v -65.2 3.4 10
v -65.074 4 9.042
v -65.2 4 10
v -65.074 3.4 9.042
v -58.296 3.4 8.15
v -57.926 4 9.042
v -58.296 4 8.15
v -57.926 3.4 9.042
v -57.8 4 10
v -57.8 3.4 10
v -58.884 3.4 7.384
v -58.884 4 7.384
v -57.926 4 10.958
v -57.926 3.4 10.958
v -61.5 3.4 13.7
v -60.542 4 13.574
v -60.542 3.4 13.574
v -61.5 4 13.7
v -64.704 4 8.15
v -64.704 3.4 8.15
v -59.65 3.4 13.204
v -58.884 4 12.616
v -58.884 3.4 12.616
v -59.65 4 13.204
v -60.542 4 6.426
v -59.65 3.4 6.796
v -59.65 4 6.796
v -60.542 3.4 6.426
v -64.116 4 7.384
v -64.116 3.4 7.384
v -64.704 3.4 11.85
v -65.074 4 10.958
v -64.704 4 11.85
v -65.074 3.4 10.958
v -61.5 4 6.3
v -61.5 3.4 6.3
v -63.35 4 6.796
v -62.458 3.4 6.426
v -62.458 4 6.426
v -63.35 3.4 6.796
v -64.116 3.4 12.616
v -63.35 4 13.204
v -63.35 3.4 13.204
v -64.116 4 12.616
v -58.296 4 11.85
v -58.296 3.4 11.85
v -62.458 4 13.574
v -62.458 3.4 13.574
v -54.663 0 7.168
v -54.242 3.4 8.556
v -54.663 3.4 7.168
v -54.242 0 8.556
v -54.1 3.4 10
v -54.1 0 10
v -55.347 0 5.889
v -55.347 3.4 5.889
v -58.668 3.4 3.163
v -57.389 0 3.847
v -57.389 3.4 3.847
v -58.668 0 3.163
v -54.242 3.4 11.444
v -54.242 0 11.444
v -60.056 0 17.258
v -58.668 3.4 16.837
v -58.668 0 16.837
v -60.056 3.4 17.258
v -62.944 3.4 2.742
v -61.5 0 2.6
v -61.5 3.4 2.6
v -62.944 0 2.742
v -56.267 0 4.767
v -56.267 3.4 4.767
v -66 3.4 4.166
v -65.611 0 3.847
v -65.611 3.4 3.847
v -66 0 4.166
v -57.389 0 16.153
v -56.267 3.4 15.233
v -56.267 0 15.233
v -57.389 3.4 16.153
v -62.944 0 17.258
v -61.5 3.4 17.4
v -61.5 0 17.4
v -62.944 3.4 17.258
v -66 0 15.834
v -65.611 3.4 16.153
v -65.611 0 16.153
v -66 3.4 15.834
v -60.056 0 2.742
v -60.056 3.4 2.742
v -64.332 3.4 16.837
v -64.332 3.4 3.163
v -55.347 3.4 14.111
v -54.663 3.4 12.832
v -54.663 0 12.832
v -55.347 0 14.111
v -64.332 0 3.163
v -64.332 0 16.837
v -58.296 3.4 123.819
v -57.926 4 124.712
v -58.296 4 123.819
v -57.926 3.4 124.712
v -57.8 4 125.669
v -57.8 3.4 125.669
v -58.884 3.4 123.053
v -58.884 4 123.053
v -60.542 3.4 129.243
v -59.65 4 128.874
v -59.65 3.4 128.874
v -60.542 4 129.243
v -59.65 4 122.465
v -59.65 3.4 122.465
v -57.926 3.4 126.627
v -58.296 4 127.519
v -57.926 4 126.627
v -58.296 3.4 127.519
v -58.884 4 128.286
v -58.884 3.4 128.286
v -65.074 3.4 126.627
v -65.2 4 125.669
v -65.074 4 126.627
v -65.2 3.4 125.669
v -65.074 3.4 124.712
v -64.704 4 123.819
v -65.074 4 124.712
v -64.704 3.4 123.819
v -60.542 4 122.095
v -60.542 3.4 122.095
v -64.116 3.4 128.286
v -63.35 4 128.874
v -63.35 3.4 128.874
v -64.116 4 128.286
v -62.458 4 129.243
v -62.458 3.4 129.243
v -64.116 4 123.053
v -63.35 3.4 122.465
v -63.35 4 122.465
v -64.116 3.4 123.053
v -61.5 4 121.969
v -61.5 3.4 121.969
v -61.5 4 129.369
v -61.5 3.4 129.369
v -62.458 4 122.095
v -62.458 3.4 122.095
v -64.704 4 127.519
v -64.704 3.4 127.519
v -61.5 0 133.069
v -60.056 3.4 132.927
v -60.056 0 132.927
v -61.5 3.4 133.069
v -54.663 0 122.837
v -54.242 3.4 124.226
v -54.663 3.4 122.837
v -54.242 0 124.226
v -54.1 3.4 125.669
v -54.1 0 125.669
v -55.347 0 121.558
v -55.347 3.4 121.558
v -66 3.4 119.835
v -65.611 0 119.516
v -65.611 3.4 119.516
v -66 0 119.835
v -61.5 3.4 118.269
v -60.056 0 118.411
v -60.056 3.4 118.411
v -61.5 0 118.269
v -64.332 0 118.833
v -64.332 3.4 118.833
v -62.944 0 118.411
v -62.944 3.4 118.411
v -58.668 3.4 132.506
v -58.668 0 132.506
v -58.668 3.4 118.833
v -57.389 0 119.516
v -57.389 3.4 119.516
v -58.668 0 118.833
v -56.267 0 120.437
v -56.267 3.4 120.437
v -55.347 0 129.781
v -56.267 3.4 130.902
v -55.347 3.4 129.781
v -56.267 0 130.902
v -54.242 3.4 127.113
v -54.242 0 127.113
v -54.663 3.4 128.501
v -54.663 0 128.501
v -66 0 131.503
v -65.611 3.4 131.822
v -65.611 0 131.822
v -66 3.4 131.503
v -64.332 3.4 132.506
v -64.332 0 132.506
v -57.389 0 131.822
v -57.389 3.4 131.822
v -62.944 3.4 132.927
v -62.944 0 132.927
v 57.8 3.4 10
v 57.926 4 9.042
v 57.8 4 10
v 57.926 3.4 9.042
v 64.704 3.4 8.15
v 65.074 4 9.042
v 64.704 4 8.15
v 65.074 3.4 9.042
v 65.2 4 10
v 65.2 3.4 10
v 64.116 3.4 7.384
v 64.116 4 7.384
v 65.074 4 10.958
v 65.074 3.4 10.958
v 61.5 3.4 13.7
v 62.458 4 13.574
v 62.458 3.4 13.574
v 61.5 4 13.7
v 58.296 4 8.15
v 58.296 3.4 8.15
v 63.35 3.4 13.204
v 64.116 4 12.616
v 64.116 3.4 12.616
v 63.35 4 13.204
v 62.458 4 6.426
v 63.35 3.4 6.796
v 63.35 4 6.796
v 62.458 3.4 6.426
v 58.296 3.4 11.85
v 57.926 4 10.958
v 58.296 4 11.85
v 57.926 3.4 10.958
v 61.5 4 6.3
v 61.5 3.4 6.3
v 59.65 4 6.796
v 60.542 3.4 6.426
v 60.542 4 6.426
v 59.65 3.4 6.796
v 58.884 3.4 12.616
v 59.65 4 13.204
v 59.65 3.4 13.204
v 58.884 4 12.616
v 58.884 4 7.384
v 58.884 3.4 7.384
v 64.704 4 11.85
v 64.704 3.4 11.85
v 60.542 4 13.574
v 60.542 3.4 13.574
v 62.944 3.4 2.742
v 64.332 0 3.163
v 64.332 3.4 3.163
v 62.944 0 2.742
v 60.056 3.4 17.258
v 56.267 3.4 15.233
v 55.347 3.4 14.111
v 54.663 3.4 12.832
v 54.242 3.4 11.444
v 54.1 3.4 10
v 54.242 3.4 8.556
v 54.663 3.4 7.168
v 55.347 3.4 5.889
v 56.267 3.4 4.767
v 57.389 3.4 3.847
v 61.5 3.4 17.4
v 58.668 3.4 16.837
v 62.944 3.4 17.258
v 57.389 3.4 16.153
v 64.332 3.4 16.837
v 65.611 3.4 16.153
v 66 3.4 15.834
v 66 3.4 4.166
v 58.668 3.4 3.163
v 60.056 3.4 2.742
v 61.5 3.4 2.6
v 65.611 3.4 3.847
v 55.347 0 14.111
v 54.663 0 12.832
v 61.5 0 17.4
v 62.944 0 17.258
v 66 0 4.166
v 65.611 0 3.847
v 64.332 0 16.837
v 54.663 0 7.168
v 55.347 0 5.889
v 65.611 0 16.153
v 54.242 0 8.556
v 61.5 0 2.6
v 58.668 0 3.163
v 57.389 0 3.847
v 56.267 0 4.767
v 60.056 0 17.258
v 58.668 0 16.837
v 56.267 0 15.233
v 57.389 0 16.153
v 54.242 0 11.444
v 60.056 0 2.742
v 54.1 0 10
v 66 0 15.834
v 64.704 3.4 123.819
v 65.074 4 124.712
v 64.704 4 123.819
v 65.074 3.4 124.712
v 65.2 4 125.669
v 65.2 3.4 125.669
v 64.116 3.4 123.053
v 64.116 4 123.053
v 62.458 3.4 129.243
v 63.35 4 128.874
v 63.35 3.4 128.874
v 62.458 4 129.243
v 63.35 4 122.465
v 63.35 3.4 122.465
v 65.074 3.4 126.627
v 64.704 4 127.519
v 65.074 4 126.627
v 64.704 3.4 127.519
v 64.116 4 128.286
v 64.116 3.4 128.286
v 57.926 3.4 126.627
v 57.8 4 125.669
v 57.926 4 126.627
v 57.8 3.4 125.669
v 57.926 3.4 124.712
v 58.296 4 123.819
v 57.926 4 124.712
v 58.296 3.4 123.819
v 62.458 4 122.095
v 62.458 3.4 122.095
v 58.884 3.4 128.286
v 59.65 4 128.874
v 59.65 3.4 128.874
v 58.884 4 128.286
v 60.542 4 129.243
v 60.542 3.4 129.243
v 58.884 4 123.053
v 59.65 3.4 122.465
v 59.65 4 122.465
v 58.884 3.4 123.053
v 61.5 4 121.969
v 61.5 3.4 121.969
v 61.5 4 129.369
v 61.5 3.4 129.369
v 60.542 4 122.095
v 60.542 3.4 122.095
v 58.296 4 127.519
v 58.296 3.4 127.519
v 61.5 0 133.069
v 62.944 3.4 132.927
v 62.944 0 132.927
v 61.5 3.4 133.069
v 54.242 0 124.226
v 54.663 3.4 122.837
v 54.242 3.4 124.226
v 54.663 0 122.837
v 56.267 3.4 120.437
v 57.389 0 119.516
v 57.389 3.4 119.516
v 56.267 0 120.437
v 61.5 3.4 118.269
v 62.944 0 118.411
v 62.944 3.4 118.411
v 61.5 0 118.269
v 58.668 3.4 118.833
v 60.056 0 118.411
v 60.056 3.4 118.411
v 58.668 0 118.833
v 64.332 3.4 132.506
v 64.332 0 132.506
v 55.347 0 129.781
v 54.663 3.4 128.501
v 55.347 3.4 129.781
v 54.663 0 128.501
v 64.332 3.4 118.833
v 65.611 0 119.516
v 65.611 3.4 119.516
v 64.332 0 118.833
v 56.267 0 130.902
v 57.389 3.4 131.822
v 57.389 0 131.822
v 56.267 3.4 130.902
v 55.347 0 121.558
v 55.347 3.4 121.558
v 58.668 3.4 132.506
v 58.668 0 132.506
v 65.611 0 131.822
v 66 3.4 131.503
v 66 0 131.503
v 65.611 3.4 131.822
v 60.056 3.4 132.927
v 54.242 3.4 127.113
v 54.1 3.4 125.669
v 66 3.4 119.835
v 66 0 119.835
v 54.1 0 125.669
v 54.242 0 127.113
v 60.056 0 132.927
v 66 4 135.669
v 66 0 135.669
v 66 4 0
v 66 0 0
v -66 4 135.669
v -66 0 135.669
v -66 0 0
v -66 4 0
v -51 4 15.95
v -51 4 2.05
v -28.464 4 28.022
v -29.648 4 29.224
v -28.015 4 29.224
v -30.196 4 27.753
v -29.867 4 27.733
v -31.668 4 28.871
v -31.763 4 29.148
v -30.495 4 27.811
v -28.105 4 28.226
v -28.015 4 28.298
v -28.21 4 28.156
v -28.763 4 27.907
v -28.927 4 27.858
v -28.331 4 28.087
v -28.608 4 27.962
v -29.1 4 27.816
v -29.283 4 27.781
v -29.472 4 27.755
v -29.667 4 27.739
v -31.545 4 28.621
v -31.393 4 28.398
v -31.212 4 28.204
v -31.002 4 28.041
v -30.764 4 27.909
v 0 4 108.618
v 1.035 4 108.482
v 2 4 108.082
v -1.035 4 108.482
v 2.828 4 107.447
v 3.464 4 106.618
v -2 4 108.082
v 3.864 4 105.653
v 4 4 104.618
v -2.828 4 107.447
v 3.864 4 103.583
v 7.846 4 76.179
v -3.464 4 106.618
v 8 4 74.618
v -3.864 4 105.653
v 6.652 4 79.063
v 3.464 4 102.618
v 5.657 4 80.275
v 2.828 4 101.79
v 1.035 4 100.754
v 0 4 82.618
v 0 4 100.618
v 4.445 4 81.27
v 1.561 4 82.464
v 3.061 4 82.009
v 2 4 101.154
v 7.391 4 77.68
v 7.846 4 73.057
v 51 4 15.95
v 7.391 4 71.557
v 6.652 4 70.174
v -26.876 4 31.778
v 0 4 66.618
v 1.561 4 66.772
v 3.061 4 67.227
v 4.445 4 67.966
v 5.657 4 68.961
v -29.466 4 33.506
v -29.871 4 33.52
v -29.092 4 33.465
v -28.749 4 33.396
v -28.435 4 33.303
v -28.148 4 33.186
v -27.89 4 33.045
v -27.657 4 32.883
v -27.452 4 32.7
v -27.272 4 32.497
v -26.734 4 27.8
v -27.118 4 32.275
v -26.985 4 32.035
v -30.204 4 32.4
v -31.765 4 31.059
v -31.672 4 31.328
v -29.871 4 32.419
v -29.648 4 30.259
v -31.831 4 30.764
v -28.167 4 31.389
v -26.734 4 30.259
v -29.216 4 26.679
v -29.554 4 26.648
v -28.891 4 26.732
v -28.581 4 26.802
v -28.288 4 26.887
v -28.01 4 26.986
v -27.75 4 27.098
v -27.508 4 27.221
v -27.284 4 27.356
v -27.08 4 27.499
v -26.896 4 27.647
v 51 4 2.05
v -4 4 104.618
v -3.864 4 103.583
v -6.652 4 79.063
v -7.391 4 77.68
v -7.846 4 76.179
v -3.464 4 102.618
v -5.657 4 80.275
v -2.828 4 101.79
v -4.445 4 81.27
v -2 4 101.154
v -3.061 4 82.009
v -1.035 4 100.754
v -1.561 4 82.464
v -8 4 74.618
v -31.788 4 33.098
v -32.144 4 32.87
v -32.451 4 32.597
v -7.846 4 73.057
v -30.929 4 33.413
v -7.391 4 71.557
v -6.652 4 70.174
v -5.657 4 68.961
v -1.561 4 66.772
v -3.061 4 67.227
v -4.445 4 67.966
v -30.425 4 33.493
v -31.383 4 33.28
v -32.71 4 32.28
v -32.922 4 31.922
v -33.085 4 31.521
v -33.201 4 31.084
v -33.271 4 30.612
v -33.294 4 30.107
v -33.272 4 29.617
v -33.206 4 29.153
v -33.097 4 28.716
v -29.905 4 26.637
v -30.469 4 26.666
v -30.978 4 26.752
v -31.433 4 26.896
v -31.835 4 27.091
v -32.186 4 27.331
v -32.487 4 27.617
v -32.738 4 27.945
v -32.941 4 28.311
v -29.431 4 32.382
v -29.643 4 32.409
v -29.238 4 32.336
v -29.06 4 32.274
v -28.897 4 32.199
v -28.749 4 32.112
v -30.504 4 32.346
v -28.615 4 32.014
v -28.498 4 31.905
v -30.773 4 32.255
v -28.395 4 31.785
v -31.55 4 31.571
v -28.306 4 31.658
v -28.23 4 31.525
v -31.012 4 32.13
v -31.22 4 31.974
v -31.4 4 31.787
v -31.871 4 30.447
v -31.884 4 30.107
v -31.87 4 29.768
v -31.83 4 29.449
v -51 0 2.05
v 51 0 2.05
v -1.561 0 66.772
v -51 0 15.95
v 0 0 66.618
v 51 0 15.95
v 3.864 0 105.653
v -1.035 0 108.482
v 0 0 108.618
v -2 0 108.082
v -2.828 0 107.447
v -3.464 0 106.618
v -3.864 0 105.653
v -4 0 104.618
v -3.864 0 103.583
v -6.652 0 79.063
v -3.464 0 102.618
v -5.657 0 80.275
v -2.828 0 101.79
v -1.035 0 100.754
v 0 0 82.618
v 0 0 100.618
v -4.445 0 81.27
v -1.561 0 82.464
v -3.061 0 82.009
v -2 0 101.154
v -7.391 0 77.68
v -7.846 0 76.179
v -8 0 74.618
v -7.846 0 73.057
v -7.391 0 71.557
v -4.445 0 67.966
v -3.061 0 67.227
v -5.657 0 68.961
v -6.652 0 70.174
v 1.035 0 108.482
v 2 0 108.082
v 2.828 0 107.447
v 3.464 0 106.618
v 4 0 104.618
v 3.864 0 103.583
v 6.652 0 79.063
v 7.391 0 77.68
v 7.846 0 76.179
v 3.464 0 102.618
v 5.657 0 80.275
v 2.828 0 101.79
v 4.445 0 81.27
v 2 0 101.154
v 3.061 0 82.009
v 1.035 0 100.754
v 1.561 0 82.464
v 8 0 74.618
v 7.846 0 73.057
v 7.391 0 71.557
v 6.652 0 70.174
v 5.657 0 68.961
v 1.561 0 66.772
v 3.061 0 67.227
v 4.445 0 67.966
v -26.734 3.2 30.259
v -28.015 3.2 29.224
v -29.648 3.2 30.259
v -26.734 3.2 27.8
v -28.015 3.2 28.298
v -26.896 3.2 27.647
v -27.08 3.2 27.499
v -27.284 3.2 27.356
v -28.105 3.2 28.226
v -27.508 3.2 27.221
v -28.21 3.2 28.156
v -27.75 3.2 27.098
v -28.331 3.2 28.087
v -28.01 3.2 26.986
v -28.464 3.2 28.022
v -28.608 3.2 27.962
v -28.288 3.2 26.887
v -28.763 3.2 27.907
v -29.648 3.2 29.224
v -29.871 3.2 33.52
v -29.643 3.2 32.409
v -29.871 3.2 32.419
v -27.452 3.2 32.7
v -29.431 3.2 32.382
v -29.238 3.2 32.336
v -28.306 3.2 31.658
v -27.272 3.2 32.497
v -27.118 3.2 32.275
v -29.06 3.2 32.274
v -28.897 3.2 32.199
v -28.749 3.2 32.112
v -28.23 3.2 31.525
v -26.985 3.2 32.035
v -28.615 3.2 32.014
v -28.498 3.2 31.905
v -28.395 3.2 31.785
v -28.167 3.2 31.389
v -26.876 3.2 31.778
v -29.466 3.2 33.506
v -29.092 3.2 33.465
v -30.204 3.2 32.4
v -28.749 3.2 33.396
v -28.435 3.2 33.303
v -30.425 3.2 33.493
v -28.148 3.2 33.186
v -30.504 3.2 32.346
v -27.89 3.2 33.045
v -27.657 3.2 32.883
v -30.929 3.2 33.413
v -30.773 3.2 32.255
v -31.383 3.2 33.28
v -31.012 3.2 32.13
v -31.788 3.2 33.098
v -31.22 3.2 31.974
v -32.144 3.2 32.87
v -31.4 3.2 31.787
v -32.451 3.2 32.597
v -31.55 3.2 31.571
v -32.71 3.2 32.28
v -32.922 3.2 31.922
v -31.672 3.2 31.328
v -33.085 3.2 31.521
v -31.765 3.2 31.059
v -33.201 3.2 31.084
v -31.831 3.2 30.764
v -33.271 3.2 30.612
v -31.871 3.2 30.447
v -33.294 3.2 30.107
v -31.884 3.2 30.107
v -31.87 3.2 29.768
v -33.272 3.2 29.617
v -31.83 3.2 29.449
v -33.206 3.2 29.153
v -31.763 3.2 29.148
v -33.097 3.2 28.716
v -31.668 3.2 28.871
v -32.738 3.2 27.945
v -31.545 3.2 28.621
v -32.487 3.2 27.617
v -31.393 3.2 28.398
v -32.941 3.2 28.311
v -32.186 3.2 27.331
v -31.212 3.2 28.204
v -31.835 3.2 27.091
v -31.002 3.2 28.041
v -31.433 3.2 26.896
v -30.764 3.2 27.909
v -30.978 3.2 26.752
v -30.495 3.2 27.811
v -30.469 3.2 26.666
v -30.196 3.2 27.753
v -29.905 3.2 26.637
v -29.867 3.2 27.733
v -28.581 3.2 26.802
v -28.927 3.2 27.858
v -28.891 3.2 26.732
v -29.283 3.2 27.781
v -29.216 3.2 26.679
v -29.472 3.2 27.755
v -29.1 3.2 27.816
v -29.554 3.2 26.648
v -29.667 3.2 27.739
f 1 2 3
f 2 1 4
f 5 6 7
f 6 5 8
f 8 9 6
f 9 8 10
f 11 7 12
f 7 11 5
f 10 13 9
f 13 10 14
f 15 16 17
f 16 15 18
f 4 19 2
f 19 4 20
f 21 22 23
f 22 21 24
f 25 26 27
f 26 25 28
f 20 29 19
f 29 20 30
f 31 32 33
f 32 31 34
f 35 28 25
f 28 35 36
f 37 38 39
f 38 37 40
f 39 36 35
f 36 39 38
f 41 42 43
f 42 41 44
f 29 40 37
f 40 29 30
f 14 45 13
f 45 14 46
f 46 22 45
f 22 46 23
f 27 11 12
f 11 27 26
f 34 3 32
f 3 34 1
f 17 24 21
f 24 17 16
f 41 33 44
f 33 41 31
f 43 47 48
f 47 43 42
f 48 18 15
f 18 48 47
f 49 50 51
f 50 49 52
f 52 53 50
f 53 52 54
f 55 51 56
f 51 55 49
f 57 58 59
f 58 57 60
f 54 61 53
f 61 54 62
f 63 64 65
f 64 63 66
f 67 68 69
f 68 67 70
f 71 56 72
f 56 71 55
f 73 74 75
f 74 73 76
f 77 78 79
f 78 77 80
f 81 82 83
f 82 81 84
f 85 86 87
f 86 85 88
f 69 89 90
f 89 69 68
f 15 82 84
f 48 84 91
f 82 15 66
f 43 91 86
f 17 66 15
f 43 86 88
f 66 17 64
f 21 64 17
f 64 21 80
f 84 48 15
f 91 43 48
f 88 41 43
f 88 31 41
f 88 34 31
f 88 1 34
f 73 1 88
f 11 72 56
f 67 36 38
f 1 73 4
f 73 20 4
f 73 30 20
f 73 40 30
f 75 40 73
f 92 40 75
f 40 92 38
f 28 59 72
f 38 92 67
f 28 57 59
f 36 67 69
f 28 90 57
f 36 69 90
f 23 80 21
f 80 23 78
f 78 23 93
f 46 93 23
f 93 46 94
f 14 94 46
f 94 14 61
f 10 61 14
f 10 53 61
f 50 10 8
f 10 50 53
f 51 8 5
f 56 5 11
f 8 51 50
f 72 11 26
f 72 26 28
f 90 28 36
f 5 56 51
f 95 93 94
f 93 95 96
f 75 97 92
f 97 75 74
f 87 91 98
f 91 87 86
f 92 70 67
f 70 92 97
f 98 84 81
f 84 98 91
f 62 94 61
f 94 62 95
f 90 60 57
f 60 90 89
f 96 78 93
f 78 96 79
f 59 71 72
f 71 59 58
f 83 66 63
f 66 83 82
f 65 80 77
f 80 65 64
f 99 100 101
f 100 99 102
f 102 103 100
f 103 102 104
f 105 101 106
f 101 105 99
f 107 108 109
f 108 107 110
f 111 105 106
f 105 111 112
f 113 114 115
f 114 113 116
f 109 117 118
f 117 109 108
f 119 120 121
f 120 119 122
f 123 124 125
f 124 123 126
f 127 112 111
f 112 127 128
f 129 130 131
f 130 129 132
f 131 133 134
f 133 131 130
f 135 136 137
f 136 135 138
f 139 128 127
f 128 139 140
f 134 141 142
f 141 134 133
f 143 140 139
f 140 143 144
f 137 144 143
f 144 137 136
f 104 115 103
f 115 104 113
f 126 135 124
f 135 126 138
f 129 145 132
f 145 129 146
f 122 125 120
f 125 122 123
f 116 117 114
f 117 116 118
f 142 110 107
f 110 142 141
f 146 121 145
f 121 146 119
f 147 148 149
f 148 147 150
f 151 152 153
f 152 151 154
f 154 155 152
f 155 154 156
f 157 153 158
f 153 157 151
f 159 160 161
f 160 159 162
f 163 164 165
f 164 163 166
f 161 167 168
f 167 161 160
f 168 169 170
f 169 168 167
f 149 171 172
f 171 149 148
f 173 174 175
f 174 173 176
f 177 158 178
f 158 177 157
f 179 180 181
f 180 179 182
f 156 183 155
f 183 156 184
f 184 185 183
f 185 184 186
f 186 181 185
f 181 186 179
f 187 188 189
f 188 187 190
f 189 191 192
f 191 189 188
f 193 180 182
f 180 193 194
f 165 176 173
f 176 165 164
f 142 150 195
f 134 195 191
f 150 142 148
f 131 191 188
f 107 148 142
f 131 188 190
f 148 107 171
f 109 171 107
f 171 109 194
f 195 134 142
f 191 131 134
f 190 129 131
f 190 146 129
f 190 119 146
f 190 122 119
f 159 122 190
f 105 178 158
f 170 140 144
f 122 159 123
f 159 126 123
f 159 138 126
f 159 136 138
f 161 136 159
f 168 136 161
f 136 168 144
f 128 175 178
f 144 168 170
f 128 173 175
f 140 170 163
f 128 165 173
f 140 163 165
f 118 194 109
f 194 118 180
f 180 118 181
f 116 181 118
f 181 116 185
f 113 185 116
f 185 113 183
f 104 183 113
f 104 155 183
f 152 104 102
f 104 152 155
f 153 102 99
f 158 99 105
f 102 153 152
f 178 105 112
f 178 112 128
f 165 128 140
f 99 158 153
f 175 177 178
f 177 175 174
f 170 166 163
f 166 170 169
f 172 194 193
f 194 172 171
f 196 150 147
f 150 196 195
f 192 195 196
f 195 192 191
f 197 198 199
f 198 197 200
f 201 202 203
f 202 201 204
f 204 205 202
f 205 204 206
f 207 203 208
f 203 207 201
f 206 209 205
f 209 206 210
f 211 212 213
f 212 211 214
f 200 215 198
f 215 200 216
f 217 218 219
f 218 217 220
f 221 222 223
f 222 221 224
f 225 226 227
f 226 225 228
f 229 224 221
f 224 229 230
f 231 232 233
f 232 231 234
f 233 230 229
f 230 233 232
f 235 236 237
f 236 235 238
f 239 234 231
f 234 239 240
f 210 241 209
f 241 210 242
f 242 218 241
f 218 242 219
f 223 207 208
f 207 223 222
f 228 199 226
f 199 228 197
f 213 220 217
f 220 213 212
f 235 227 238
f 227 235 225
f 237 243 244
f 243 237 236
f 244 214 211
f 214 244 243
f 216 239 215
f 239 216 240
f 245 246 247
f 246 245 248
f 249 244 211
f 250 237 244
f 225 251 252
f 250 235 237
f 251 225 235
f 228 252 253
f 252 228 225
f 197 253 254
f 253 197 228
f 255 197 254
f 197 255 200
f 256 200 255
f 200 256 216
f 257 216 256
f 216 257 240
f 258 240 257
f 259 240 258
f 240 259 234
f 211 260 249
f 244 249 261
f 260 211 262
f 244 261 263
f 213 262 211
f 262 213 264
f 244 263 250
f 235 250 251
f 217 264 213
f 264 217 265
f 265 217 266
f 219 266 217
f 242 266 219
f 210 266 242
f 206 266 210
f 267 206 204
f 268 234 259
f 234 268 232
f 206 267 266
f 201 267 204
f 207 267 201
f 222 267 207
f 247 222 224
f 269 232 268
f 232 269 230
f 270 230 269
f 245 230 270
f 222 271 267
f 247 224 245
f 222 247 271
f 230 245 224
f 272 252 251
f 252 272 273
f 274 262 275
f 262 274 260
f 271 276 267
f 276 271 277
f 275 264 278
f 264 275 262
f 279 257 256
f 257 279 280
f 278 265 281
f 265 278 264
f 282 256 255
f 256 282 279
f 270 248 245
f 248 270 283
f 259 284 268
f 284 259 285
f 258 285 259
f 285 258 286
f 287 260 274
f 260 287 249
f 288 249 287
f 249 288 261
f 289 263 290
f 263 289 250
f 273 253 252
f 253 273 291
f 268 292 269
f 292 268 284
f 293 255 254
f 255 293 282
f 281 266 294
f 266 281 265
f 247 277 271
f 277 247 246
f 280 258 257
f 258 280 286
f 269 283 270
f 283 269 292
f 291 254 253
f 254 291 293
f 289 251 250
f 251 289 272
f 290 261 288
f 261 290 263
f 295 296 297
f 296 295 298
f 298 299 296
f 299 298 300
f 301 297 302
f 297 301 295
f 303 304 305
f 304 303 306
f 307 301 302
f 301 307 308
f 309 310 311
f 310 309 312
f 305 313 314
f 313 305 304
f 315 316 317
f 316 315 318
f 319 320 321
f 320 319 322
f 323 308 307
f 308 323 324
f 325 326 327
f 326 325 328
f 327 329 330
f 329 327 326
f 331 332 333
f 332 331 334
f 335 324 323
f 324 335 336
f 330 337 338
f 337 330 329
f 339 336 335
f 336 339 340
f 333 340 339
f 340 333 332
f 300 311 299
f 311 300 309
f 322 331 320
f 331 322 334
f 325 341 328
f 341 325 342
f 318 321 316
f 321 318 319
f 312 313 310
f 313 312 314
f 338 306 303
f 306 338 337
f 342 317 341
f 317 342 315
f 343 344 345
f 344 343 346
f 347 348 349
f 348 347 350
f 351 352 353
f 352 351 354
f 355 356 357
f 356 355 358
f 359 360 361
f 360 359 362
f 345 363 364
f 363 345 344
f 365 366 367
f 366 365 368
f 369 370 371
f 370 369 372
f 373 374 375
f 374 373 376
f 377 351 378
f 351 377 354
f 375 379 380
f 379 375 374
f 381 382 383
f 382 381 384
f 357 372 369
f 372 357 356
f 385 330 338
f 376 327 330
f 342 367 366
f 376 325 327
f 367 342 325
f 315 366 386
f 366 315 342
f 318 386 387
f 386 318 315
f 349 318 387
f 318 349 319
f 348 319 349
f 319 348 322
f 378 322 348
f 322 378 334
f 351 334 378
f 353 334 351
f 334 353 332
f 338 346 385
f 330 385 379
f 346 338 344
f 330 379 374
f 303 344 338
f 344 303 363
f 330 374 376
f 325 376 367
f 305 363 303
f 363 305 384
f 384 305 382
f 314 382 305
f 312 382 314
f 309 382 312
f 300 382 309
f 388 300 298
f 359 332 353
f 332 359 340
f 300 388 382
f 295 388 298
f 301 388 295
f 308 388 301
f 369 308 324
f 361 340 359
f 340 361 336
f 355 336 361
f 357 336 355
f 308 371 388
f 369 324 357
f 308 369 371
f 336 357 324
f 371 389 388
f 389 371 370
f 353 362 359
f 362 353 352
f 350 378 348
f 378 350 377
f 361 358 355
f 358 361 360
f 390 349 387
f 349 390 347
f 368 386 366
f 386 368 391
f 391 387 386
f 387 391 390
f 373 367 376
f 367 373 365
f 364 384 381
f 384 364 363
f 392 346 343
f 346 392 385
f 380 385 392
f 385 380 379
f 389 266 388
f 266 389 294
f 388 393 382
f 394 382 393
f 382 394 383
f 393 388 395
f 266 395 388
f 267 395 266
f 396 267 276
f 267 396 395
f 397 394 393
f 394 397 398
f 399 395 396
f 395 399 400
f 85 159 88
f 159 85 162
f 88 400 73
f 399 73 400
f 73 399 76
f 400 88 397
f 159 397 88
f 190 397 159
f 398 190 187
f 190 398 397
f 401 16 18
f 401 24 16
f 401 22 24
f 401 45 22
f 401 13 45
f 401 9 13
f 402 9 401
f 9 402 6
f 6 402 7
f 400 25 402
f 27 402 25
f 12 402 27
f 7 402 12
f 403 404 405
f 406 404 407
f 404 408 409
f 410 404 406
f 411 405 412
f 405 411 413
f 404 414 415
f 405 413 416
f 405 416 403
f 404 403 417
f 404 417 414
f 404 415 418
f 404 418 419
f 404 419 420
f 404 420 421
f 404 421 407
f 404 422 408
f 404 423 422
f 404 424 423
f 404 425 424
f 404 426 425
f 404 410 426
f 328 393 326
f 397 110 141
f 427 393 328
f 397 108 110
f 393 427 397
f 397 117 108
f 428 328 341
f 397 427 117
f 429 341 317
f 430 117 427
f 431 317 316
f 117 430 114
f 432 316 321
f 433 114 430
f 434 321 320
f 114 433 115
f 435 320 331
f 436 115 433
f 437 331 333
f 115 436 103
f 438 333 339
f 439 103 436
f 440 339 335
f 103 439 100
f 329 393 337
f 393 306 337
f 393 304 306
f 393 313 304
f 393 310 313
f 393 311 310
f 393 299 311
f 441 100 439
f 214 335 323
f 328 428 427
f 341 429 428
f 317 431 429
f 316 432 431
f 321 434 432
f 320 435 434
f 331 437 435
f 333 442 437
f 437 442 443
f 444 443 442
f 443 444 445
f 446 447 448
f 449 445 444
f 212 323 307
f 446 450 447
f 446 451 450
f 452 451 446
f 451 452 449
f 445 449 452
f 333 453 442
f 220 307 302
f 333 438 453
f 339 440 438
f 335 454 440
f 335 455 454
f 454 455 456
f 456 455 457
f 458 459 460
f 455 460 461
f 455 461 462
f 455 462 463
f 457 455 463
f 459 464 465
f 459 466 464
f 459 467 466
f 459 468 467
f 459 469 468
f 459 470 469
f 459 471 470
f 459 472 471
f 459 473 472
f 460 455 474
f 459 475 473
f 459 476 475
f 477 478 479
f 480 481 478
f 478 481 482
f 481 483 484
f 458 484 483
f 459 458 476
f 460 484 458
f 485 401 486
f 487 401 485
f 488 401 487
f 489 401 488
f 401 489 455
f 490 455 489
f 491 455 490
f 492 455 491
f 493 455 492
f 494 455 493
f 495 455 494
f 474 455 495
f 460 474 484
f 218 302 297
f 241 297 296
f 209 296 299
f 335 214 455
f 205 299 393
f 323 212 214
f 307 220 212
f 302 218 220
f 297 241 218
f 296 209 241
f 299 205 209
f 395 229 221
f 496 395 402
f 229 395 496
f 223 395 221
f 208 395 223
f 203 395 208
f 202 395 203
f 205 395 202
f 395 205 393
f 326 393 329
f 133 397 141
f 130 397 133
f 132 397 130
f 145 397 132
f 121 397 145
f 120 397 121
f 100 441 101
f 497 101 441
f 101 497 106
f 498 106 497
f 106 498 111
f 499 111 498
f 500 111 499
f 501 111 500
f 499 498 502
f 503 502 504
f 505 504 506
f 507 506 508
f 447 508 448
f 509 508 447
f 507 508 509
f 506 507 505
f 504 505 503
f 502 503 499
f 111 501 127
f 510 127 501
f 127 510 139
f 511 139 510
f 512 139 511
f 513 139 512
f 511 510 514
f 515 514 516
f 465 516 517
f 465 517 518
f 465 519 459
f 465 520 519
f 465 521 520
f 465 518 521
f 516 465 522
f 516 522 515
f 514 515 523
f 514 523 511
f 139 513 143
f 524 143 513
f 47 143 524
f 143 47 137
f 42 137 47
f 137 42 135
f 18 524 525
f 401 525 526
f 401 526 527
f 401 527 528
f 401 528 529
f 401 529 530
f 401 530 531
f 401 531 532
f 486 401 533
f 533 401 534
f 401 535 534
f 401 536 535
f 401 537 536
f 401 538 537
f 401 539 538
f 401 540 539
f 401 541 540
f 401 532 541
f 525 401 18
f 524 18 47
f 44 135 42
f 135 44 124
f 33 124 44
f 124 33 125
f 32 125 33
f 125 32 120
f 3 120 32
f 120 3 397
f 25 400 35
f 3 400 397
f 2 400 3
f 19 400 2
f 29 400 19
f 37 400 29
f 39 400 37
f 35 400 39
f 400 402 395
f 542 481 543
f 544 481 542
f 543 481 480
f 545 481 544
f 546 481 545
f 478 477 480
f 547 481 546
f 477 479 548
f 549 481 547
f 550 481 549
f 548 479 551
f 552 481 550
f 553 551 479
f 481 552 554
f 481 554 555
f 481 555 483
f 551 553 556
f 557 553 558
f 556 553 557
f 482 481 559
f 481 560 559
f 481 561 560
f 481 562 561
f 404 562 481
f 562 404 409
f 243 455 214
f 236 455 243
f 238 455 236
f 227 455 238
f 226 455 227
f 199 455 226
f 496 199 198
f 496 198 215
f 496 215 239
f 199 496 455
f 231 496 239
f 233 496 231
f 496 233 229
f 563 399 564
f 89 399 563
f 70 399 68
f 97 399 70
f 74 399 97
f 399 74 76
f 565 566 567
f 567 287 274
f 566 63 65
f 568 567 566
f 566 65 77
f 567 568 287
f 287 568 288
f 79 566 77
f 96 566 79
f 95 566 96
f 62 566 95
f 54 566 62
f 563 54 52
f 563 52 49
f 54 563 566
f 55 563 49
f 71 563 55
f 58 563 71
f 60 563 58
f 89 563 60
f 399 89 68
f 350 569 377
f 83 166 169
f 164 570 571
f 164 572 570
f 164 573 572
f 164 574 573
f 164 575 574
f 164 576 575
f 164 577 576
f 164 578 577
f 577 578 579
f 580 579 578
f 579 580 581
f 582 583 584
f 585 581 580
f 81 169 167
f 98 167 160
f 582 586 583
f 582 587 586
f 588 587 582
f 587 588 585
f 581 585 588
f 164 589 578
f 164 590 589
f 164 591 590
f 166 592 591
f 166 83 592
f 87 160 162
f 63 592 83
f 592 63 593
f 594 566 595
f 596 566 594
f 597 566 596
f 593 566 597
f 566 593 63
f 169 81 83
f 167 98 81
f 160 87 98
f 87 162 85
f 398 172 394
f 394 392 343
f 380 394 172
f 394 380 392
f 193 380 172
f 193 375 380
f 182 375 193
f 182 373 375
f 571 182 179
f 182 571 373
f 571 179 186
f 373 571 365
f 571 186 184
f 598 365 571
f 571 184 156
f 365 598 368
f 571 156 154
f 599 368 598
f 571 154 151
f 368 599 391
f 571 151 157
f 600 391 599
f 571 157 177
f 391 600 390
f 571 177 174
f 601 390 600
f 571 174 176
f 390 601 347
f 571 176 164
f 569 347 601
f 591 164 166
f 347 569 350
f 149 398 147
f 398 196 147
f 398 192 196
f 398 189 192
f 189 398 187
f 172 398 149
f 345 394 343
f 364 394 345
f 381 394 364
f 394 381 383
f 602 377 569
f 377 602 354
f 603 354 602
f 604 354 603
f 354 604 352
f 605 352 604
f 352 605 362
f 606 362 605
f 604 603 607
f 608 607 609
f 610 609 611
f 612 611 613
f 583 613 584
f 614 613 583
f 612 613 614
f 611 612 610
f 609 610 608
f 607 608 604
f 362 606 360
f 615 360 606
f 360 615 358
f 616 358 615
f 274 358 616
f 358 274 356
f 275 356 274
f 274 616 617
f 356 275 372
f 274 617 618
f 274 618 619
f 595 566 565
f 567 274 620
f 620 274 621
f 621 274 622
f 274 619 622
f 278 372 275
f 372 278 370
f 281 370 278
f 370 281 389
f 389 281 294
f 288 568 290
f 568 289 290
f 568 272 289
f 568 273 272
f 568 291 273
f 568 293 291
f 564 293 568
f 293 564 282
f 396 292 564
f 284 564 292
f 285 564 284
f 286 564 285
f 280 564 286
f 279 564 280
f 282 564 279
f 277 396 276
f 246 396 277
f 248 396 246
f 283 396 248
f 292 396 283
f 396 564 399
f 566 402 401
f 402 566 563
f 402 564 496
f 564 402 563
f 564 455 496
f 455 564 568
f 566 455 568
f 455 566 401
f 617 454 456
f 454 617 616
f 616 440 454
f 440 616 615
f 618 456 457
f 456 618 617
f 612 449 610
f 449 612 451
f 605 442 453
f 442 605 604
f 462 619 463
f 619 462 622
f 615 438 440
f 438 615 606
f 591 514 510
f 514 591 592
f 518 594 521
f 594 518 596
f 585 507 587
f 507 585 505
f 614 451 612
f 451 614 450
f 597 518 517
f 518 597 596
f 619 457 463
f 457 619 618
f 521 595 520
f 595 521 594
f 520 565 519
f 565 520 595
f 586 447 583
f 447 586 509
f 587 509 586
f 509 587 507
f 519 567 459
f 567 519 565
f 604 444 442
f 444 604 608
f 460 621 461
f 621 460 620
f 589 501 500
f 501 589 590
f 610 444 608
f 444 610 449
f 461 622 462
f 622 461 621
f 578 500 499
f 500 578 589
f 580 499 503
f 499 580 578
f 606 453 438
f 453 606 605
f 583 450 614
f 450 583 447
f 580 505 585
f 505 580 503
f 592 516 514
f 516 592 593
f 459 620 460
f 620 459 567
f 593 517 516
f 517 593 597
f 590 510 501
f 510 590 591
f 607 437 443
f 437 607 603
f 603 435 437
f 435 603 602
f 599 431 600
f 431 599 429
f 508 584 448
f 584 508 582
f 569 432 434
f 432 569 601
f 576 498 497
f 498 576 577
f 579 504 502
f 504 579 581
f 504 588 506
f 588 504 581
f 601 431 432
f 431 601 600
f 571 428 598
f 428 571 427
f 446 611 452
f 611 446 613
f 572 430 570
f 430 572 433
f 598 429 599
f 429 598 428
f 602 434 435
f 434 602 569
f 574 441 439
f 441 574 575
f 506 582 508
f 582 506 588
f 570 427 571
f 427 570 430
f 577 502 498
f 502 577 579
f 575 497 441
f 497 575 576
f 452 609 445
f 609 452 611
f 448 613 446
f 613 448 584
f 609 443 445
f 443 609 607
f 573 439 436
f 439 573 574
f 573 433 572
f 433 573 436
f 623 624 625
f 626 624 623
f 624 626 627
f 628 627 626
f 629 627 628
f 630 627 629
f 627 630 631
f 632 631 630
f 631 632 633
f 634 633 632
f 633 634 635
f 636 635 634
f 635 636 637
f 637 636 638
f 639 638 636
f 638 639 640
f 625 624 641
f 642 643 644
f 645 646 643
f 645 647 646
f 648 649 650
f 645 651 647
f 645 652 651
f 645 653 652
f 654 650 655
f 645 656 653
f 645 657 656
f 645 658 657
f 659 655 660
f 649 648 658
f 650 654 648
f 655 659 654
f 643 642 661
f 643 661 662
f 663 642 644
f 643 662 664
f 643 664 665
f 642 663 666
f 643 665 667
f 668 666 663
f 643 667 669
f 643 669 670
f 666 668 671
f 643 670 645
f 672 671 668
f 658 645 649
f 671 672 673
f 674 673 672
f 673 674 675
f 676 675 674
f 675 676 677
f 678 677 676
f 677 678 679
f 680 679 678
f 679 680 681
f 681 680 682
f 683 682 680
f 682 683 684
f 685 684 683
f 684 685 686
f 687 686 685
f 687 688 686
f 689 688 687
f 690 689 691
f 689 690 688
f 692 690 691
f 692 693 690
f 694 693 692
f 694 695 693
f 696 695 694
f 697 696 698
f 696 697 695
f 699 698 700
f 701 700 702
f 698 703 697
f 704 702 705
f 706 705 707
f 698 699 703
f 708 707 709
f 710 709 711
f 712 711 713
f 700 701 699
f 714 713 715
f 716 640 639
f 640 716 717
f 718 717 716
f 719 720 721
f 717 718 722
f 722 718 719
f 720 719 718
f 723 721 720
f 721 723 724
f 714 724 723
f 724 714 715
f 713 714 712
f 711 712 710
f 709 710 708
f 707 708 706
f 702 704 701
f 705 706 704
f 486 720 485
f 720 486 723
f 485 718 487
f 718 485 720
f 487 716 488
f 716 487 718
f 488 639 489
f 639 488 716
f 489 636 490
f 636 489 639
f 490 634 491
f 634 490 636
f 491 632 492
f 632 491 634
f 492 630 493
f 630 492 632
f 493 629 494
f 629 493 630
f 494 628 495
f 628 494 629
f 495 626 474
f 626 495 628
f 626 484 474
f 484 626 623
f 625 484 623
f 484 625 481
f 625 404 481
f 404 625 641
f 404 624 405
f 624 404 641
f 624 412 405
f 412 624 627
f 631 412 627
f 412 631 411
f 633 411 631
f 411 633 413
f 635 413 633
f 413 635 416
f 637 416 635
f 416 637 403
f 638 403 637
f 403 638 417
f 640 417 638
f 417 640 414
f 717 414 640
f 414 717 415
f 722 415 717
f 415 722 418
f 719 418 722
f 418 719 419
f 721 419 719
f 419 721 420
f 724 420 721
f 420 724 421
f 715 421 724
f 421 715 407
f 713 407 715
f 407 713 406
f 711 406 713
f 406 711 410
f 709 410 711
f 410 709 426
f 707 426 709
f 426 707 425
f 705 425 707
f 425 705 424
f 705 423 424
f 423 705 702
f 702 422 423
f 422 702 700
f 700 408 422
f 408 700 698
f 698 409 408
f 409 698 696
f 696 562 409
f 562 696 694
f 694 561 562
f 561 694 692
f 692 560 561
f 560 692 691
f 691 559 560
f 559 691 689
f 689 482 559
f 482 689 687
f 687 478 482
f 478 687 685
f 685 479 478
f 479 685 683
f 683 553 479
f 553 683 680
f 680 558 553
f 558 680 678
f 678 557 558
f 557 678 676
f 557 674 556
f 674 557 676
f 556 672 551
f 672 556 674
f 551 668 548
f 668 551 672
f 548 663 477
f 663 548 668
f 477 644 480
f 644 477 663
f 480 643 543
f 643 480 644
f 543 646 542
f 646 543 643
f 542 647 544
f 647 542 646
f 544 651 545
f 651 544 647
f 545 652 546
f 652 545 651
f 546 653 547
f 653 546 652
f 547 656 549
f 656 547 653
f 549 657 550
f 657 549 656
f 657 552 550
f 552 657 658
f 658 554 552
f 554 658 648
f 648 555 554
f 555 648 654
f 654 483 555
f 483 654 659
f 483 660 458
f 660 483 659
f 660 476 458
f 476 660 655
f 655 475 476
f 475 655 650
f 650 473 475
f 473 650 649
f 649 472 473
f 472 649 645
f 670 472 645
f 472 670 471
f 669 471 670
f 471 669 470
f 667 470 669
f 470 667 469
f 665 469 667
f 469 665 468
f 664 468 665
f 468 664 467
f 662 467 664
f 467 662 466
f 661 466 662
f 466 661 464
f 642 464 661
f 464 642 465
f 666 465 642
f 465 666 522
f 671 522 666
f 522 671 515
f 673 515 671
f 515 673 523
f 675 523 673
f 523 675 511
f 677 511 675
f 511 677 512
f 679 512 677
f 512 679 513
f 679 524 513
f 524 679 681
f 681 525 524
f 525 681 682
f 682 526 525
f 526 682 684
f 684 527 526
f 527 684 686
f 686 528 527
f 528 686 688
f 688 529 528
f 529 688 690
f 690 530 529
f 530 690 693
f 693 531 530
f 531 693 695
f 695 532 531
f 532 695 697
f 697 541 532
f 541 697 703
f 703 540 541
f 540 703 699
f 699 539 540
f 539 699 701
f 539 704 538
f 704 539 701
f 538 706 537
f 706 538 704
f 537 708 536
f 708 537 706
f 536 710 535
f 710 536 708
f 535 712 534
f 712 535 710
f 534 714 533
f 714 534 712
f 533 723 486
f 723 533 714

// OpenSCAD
// Pannello frontale — stampa 1x (o taglialo da un pannello piatto:
// legno/plexiglass/alluminio, usando questo file solo come dima/misure).
// Copre solo la parte bassa del mobile (rullo/scivolo): la tramoggia sopra
// resta chiusa dalle sue stesse pareti, quindi questo pannello sta sotto i
// 250mm e non va spezzato per la stampa. Ospita: pulsante di erogazione,
// LED di stato, feritoia di uscita allineata allo scivolo (chute.scad).
//
// SICUREZZA: la feritoia deve restare lunga quanto la sigaretta (non si
// può restringere sotto quella misura, è un vincolo fisico del prodotto),
// quindi da sola NON impedisce di infilare una mano — è lo scivolo dietro
// di essa (le alette sfalsate in chute.scad) a impedire di raggiungere in
// linea retta il rullo. Qui riduciamo solo la larghezza al minimo utile.
//
// Stessa convenzione di assi del mobile (params.scad): X = larghezza
// (centrata su 0), Z = altezza da terra, Y = spessore/profondità.
include <params.scad>
include <helpers.scad>

panel_w = cab_w;
panel_h = front_panel_h;
panel_t = 4;

button_d   = 16;   // pulsante momentaneo antivandalo 16mm, foro standard
led_d      = 8;
slot_w     = drop_w + 8;       // un po' più larga dell'uscita dello scivolo
slot_h     = cig_d + 6;        // stretta il giusto per far uscire la sigaretta
slot_z     = chute_bottom_z;   // allineata all'uscita reale dello scivolo
button_z   = panel_h * 0.55;
led_z      = button_z + 30;

// fori di fissaggio ai fianchi (J/L): centrati sullo spessore dei pannelli
// laterali (non sul loro bordo — un foro esattamente sul bordo manca il
// materiale), vedi side_panel_seg_3d() in cabinet.scad per il foro
// filettato corrispondente, bucato di taglio nel bordo anteriore del fianco
fix_x = cab_w/2 - panel_mat_t/2;

module front_panel() {
    difference() {
        translate([-panel_w/2, 0, 0])
            cube([panel_w, panel_t, panel_h]);
        // feritoia di uscita, allineata allo scivolo
        translate([0, -1, slot_z])
            rotate([-90, 0, 0])
                linear_extrude(height = panel_t + 2)
                    square([slot_w, slot_h], center = true);
        // pulsante
        translate([0, -1, button_z])
            rotate([-90, 0, 0])
                cylinder(d = button_d, h = panel_t + 2, $fn = 32);
        // LED di stato, sopra al pulsante
        translate([0, -1, led_z])
            rotate([-90, 0, 0])
                cylinder(d = led_d, h = panel_t + 2, $fn = 24);
        // fori di fissaggio: passaggio vite stampata (helpers.scad) verso
        // il fianco, con svasatura per la testa esagonale sulla faccia
        // esterna (y=0, quella vista dall'utente) così non sporge
        for (x = [-fix_x, fix_x])
            for (z = [10, panel_h - 10]) {
                translate([x, -1, z])
                    rotate([-90, 0, 0])
                        cylinder(d = printed_screw_clear_d, h = panel_t + 2, $fn = 24);
                translate([x, -0.01, z])
                    rotate([-90, 0, 0])
                        cylinder(d = printed_screw_counterbore_d,
                                 h = printed_screw_counterbore_h + 0.01, $fn = 32);
            }
        // Lettera "G" (vedi assembly-guide.md): incisa sulla faccia interna
        // (verso il mobile, y = panel_t), tra la feritoia e il pulsante
        label_cut_y("G", -30, panel_t, 30, size = 7);
    }
}

front_panel();
